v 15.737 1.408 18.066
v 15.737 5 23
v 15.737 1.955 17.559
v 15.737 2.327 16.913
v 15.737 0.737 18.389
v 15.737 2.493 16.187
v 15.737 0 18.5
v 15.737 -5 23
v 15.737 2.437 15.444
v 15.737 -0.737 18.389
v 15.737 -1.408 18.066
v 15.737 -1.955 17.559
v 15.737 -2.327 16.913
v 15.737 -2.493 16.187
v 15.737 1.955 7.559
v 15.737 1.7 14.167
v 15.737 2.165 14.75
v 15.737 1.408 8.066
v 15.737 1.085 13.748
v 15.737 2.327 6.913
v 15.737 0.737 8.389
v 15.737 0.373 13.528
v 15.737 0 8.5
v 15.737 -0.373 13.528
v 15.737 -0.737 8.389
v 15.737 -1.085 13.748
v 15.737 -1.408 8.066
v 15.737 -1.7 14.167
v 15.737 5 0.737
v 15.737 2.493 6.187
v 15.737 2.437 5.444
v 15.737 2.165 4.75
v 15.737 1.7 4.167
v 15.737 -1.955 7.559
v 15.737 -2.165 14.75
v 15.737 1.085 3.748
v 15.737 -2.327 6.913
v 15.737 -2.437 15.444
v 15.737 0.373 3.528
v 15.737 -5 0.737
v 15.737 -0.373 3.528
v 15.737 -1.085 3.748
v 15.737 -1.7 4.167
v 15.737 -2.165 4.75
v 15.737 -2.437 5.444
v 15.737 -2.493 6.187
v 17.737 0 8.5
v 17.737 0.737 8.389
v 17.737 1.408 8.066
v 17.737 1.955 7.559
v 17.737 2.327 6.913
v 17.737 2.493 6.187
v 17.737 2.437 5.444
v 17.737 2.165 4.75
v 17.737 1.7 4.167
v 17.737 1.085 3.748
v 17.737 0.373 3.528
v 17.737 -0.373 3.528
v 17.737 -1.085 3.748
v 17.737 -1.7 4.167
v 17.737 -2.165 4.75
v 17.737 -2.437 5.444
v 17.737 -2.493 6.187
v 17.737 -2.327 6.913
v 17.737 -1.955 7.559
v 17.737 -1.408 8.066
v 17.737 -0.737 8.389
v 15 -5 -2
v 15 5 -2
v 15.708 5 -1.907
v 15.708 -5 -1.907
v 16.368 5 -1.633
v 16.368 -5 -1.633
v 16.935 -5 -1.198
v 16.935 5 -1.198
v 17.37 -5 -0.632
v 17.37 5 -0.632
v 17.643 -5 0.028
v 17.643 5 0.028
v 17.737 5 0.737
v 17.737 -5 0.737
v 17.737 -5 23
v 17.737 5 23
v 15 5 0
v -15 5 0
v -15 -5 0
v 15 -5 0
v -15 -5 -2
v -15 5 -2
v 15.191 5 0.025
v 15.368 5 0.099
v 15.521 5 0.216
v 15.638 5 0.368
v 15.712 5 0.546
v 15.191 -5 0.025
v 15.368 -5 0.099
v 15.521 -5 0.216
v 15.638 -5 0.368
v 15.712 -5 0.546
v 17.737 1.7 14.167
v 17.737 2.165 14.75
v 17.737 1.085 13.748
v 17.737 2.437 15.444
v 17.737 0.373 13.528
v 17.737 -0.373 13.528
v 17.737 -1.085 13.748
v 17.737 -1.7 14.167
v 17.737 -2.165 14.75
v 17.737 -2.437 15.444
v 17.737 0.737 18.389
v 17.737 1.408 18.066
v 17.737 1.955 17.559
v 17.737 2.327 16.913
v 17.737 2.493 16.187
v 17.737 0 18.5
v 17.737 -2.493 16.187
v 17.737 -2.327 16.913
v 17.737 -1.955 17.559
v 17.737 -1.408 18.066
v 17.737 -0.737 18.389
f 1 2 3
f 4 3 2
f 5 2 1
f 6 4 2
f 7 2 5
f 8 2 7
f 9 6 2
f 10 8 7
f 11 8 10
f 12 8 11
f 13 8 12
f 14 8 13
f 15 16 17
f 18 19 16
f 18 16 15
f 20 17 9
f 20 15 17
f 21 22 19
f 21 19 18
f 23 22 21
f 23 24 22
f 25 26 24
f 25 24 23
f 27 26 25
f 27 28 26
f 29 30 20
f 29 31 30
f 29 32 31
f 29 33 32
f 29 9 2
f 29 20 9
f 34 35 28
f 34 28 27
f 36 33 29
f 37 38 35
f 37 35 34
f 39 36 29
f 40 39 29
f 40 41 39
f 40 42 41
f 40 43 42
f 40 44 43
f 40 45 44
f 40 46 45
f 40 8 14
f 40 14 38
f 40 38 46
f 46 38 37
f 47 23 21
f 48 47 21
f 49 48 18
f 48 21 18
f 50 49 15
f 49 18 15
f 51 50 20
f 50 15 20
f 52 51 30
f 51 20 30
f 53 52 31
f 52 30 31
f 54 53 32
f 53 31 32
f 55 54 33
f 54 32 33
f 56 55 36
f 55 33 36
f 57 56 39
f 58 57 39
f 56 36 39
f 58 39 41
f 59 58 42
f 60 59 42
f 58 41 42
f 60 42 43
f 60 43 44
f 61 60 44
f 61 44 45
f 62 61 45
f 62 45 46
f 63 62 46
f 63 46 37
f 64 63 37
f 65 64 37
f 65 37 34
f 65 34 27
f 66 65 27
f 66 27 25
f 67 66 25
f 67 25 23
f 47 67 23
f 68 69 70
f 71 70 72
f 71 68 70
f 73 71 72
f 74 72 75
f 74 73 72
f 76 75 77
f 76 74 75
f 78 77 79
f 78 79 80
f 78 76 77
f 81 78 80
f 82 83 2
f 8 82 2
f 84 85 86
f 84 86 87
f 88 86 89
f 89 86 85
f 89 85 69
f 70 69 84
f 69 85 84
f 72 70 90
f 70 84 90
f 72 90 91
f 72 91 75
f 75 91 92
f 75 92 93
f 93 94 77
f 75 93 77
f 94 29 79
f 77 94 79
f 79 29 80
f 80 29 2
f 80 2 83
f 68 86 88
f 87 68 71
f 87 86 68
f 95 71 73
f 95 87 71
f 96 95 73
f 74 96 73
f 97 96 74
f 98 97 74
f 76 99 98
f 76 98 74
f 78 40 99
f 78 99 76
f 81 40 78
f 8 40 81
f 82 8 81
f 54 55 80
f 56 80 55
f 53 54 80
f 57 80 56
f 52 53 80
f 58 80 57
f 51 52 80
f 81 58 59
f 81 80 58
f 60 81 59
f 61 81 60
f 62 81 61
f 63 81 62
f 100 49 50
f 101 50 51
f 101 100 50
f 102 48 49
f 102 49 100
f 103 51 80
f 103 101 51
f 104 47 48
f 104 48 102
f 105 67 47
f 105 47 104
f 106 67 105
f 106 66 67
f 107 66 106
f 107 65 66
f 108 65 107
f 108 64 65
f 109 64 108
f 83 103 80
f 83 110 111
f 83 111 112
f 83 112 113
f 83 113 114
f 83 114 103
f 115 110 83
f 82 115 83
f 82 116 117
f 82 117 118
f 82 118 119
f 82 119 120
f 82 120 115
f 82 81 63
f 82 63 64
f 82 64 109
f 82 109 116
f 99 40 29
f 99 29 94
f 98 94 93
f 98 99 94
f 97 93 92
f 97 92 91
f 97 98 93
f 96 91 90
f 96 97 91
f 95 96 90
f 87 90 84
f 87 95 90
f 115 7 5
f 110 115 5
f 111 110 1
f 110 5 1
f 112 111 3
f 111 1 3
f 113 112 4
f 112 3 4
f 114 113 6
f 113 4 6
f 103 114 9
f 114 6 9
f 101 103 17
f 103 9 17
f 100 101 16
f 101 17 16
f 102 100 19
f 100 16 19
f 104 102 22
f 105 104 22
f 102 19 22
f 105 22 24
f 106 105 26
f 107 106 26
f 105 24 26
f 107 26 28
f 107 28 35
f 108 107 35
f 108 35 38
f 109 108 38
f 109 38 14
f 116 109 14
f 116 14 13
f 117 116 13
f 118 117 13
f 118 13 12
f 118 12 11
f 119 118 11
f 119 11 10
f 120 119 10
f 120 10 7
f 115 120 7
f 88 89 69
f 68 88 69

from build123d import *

# Parameters (mm, degrees)
SKETCH2_W          = 30
SKETCH2_H          = 10
BASE_FLANGE1_DEPTH = 2
EDGE_FLANGE1_DEPTH = 10
SKETCH10_R         = 2.5
CUT_EXTRUDE1_DEPTH = 39.713545169


# Sheet-metal steps are written as plain solids
with BuildPart() as part:
    # Sketch2 → Base-Flange1 (new body)
    with BuildSketch(Plane.XY):
        Rectangle(SKETCH2_W, SKETCH2_H)
    extrude(amount=-BASE_FLANGE1_DEPTH)

    # Edge-Flange1 section (across the edge) → Edge-Flange1 (add)
    with BuildSketch(Plane(origin=(15.7366, -5, 0), x_dir=(-1, 0, 0), z_dir=(0, 1, 0))):
        with BuildLine():
            Line((-2, 0.7366), (-2, 23))
            Line((-2, 23), (0, 23))
            Line((0, 23), (0, 0.7366))
            ThreePointArc((0, 0.7366), (0.215745145, 0.215745145), (0.7366, 0))
            Line((0.7366, 0), (0.7366, -2))
            ThreePointArc((0.7366, -2), (-1.198468417, -1.198468417), (-2, 0.7366))
        make_face()
    extrude(amount=EDGE_FLANGE1_DEPTH)

    # Sketch10 → Cut-Extrude1 (cut, through all)
    with BuildSketch(Plane.ZY.offset(-15.7366)):
        with Locations((6, 0)):
            Circle(SKETCH10_R)
        with Locations((16, 0)):
            Circle(SKETCH10_R)
    extrude(amount=-CUT_EXTRUDE1_DEPTH, mode=Mode.SUBTRACT)


solid = part.part
